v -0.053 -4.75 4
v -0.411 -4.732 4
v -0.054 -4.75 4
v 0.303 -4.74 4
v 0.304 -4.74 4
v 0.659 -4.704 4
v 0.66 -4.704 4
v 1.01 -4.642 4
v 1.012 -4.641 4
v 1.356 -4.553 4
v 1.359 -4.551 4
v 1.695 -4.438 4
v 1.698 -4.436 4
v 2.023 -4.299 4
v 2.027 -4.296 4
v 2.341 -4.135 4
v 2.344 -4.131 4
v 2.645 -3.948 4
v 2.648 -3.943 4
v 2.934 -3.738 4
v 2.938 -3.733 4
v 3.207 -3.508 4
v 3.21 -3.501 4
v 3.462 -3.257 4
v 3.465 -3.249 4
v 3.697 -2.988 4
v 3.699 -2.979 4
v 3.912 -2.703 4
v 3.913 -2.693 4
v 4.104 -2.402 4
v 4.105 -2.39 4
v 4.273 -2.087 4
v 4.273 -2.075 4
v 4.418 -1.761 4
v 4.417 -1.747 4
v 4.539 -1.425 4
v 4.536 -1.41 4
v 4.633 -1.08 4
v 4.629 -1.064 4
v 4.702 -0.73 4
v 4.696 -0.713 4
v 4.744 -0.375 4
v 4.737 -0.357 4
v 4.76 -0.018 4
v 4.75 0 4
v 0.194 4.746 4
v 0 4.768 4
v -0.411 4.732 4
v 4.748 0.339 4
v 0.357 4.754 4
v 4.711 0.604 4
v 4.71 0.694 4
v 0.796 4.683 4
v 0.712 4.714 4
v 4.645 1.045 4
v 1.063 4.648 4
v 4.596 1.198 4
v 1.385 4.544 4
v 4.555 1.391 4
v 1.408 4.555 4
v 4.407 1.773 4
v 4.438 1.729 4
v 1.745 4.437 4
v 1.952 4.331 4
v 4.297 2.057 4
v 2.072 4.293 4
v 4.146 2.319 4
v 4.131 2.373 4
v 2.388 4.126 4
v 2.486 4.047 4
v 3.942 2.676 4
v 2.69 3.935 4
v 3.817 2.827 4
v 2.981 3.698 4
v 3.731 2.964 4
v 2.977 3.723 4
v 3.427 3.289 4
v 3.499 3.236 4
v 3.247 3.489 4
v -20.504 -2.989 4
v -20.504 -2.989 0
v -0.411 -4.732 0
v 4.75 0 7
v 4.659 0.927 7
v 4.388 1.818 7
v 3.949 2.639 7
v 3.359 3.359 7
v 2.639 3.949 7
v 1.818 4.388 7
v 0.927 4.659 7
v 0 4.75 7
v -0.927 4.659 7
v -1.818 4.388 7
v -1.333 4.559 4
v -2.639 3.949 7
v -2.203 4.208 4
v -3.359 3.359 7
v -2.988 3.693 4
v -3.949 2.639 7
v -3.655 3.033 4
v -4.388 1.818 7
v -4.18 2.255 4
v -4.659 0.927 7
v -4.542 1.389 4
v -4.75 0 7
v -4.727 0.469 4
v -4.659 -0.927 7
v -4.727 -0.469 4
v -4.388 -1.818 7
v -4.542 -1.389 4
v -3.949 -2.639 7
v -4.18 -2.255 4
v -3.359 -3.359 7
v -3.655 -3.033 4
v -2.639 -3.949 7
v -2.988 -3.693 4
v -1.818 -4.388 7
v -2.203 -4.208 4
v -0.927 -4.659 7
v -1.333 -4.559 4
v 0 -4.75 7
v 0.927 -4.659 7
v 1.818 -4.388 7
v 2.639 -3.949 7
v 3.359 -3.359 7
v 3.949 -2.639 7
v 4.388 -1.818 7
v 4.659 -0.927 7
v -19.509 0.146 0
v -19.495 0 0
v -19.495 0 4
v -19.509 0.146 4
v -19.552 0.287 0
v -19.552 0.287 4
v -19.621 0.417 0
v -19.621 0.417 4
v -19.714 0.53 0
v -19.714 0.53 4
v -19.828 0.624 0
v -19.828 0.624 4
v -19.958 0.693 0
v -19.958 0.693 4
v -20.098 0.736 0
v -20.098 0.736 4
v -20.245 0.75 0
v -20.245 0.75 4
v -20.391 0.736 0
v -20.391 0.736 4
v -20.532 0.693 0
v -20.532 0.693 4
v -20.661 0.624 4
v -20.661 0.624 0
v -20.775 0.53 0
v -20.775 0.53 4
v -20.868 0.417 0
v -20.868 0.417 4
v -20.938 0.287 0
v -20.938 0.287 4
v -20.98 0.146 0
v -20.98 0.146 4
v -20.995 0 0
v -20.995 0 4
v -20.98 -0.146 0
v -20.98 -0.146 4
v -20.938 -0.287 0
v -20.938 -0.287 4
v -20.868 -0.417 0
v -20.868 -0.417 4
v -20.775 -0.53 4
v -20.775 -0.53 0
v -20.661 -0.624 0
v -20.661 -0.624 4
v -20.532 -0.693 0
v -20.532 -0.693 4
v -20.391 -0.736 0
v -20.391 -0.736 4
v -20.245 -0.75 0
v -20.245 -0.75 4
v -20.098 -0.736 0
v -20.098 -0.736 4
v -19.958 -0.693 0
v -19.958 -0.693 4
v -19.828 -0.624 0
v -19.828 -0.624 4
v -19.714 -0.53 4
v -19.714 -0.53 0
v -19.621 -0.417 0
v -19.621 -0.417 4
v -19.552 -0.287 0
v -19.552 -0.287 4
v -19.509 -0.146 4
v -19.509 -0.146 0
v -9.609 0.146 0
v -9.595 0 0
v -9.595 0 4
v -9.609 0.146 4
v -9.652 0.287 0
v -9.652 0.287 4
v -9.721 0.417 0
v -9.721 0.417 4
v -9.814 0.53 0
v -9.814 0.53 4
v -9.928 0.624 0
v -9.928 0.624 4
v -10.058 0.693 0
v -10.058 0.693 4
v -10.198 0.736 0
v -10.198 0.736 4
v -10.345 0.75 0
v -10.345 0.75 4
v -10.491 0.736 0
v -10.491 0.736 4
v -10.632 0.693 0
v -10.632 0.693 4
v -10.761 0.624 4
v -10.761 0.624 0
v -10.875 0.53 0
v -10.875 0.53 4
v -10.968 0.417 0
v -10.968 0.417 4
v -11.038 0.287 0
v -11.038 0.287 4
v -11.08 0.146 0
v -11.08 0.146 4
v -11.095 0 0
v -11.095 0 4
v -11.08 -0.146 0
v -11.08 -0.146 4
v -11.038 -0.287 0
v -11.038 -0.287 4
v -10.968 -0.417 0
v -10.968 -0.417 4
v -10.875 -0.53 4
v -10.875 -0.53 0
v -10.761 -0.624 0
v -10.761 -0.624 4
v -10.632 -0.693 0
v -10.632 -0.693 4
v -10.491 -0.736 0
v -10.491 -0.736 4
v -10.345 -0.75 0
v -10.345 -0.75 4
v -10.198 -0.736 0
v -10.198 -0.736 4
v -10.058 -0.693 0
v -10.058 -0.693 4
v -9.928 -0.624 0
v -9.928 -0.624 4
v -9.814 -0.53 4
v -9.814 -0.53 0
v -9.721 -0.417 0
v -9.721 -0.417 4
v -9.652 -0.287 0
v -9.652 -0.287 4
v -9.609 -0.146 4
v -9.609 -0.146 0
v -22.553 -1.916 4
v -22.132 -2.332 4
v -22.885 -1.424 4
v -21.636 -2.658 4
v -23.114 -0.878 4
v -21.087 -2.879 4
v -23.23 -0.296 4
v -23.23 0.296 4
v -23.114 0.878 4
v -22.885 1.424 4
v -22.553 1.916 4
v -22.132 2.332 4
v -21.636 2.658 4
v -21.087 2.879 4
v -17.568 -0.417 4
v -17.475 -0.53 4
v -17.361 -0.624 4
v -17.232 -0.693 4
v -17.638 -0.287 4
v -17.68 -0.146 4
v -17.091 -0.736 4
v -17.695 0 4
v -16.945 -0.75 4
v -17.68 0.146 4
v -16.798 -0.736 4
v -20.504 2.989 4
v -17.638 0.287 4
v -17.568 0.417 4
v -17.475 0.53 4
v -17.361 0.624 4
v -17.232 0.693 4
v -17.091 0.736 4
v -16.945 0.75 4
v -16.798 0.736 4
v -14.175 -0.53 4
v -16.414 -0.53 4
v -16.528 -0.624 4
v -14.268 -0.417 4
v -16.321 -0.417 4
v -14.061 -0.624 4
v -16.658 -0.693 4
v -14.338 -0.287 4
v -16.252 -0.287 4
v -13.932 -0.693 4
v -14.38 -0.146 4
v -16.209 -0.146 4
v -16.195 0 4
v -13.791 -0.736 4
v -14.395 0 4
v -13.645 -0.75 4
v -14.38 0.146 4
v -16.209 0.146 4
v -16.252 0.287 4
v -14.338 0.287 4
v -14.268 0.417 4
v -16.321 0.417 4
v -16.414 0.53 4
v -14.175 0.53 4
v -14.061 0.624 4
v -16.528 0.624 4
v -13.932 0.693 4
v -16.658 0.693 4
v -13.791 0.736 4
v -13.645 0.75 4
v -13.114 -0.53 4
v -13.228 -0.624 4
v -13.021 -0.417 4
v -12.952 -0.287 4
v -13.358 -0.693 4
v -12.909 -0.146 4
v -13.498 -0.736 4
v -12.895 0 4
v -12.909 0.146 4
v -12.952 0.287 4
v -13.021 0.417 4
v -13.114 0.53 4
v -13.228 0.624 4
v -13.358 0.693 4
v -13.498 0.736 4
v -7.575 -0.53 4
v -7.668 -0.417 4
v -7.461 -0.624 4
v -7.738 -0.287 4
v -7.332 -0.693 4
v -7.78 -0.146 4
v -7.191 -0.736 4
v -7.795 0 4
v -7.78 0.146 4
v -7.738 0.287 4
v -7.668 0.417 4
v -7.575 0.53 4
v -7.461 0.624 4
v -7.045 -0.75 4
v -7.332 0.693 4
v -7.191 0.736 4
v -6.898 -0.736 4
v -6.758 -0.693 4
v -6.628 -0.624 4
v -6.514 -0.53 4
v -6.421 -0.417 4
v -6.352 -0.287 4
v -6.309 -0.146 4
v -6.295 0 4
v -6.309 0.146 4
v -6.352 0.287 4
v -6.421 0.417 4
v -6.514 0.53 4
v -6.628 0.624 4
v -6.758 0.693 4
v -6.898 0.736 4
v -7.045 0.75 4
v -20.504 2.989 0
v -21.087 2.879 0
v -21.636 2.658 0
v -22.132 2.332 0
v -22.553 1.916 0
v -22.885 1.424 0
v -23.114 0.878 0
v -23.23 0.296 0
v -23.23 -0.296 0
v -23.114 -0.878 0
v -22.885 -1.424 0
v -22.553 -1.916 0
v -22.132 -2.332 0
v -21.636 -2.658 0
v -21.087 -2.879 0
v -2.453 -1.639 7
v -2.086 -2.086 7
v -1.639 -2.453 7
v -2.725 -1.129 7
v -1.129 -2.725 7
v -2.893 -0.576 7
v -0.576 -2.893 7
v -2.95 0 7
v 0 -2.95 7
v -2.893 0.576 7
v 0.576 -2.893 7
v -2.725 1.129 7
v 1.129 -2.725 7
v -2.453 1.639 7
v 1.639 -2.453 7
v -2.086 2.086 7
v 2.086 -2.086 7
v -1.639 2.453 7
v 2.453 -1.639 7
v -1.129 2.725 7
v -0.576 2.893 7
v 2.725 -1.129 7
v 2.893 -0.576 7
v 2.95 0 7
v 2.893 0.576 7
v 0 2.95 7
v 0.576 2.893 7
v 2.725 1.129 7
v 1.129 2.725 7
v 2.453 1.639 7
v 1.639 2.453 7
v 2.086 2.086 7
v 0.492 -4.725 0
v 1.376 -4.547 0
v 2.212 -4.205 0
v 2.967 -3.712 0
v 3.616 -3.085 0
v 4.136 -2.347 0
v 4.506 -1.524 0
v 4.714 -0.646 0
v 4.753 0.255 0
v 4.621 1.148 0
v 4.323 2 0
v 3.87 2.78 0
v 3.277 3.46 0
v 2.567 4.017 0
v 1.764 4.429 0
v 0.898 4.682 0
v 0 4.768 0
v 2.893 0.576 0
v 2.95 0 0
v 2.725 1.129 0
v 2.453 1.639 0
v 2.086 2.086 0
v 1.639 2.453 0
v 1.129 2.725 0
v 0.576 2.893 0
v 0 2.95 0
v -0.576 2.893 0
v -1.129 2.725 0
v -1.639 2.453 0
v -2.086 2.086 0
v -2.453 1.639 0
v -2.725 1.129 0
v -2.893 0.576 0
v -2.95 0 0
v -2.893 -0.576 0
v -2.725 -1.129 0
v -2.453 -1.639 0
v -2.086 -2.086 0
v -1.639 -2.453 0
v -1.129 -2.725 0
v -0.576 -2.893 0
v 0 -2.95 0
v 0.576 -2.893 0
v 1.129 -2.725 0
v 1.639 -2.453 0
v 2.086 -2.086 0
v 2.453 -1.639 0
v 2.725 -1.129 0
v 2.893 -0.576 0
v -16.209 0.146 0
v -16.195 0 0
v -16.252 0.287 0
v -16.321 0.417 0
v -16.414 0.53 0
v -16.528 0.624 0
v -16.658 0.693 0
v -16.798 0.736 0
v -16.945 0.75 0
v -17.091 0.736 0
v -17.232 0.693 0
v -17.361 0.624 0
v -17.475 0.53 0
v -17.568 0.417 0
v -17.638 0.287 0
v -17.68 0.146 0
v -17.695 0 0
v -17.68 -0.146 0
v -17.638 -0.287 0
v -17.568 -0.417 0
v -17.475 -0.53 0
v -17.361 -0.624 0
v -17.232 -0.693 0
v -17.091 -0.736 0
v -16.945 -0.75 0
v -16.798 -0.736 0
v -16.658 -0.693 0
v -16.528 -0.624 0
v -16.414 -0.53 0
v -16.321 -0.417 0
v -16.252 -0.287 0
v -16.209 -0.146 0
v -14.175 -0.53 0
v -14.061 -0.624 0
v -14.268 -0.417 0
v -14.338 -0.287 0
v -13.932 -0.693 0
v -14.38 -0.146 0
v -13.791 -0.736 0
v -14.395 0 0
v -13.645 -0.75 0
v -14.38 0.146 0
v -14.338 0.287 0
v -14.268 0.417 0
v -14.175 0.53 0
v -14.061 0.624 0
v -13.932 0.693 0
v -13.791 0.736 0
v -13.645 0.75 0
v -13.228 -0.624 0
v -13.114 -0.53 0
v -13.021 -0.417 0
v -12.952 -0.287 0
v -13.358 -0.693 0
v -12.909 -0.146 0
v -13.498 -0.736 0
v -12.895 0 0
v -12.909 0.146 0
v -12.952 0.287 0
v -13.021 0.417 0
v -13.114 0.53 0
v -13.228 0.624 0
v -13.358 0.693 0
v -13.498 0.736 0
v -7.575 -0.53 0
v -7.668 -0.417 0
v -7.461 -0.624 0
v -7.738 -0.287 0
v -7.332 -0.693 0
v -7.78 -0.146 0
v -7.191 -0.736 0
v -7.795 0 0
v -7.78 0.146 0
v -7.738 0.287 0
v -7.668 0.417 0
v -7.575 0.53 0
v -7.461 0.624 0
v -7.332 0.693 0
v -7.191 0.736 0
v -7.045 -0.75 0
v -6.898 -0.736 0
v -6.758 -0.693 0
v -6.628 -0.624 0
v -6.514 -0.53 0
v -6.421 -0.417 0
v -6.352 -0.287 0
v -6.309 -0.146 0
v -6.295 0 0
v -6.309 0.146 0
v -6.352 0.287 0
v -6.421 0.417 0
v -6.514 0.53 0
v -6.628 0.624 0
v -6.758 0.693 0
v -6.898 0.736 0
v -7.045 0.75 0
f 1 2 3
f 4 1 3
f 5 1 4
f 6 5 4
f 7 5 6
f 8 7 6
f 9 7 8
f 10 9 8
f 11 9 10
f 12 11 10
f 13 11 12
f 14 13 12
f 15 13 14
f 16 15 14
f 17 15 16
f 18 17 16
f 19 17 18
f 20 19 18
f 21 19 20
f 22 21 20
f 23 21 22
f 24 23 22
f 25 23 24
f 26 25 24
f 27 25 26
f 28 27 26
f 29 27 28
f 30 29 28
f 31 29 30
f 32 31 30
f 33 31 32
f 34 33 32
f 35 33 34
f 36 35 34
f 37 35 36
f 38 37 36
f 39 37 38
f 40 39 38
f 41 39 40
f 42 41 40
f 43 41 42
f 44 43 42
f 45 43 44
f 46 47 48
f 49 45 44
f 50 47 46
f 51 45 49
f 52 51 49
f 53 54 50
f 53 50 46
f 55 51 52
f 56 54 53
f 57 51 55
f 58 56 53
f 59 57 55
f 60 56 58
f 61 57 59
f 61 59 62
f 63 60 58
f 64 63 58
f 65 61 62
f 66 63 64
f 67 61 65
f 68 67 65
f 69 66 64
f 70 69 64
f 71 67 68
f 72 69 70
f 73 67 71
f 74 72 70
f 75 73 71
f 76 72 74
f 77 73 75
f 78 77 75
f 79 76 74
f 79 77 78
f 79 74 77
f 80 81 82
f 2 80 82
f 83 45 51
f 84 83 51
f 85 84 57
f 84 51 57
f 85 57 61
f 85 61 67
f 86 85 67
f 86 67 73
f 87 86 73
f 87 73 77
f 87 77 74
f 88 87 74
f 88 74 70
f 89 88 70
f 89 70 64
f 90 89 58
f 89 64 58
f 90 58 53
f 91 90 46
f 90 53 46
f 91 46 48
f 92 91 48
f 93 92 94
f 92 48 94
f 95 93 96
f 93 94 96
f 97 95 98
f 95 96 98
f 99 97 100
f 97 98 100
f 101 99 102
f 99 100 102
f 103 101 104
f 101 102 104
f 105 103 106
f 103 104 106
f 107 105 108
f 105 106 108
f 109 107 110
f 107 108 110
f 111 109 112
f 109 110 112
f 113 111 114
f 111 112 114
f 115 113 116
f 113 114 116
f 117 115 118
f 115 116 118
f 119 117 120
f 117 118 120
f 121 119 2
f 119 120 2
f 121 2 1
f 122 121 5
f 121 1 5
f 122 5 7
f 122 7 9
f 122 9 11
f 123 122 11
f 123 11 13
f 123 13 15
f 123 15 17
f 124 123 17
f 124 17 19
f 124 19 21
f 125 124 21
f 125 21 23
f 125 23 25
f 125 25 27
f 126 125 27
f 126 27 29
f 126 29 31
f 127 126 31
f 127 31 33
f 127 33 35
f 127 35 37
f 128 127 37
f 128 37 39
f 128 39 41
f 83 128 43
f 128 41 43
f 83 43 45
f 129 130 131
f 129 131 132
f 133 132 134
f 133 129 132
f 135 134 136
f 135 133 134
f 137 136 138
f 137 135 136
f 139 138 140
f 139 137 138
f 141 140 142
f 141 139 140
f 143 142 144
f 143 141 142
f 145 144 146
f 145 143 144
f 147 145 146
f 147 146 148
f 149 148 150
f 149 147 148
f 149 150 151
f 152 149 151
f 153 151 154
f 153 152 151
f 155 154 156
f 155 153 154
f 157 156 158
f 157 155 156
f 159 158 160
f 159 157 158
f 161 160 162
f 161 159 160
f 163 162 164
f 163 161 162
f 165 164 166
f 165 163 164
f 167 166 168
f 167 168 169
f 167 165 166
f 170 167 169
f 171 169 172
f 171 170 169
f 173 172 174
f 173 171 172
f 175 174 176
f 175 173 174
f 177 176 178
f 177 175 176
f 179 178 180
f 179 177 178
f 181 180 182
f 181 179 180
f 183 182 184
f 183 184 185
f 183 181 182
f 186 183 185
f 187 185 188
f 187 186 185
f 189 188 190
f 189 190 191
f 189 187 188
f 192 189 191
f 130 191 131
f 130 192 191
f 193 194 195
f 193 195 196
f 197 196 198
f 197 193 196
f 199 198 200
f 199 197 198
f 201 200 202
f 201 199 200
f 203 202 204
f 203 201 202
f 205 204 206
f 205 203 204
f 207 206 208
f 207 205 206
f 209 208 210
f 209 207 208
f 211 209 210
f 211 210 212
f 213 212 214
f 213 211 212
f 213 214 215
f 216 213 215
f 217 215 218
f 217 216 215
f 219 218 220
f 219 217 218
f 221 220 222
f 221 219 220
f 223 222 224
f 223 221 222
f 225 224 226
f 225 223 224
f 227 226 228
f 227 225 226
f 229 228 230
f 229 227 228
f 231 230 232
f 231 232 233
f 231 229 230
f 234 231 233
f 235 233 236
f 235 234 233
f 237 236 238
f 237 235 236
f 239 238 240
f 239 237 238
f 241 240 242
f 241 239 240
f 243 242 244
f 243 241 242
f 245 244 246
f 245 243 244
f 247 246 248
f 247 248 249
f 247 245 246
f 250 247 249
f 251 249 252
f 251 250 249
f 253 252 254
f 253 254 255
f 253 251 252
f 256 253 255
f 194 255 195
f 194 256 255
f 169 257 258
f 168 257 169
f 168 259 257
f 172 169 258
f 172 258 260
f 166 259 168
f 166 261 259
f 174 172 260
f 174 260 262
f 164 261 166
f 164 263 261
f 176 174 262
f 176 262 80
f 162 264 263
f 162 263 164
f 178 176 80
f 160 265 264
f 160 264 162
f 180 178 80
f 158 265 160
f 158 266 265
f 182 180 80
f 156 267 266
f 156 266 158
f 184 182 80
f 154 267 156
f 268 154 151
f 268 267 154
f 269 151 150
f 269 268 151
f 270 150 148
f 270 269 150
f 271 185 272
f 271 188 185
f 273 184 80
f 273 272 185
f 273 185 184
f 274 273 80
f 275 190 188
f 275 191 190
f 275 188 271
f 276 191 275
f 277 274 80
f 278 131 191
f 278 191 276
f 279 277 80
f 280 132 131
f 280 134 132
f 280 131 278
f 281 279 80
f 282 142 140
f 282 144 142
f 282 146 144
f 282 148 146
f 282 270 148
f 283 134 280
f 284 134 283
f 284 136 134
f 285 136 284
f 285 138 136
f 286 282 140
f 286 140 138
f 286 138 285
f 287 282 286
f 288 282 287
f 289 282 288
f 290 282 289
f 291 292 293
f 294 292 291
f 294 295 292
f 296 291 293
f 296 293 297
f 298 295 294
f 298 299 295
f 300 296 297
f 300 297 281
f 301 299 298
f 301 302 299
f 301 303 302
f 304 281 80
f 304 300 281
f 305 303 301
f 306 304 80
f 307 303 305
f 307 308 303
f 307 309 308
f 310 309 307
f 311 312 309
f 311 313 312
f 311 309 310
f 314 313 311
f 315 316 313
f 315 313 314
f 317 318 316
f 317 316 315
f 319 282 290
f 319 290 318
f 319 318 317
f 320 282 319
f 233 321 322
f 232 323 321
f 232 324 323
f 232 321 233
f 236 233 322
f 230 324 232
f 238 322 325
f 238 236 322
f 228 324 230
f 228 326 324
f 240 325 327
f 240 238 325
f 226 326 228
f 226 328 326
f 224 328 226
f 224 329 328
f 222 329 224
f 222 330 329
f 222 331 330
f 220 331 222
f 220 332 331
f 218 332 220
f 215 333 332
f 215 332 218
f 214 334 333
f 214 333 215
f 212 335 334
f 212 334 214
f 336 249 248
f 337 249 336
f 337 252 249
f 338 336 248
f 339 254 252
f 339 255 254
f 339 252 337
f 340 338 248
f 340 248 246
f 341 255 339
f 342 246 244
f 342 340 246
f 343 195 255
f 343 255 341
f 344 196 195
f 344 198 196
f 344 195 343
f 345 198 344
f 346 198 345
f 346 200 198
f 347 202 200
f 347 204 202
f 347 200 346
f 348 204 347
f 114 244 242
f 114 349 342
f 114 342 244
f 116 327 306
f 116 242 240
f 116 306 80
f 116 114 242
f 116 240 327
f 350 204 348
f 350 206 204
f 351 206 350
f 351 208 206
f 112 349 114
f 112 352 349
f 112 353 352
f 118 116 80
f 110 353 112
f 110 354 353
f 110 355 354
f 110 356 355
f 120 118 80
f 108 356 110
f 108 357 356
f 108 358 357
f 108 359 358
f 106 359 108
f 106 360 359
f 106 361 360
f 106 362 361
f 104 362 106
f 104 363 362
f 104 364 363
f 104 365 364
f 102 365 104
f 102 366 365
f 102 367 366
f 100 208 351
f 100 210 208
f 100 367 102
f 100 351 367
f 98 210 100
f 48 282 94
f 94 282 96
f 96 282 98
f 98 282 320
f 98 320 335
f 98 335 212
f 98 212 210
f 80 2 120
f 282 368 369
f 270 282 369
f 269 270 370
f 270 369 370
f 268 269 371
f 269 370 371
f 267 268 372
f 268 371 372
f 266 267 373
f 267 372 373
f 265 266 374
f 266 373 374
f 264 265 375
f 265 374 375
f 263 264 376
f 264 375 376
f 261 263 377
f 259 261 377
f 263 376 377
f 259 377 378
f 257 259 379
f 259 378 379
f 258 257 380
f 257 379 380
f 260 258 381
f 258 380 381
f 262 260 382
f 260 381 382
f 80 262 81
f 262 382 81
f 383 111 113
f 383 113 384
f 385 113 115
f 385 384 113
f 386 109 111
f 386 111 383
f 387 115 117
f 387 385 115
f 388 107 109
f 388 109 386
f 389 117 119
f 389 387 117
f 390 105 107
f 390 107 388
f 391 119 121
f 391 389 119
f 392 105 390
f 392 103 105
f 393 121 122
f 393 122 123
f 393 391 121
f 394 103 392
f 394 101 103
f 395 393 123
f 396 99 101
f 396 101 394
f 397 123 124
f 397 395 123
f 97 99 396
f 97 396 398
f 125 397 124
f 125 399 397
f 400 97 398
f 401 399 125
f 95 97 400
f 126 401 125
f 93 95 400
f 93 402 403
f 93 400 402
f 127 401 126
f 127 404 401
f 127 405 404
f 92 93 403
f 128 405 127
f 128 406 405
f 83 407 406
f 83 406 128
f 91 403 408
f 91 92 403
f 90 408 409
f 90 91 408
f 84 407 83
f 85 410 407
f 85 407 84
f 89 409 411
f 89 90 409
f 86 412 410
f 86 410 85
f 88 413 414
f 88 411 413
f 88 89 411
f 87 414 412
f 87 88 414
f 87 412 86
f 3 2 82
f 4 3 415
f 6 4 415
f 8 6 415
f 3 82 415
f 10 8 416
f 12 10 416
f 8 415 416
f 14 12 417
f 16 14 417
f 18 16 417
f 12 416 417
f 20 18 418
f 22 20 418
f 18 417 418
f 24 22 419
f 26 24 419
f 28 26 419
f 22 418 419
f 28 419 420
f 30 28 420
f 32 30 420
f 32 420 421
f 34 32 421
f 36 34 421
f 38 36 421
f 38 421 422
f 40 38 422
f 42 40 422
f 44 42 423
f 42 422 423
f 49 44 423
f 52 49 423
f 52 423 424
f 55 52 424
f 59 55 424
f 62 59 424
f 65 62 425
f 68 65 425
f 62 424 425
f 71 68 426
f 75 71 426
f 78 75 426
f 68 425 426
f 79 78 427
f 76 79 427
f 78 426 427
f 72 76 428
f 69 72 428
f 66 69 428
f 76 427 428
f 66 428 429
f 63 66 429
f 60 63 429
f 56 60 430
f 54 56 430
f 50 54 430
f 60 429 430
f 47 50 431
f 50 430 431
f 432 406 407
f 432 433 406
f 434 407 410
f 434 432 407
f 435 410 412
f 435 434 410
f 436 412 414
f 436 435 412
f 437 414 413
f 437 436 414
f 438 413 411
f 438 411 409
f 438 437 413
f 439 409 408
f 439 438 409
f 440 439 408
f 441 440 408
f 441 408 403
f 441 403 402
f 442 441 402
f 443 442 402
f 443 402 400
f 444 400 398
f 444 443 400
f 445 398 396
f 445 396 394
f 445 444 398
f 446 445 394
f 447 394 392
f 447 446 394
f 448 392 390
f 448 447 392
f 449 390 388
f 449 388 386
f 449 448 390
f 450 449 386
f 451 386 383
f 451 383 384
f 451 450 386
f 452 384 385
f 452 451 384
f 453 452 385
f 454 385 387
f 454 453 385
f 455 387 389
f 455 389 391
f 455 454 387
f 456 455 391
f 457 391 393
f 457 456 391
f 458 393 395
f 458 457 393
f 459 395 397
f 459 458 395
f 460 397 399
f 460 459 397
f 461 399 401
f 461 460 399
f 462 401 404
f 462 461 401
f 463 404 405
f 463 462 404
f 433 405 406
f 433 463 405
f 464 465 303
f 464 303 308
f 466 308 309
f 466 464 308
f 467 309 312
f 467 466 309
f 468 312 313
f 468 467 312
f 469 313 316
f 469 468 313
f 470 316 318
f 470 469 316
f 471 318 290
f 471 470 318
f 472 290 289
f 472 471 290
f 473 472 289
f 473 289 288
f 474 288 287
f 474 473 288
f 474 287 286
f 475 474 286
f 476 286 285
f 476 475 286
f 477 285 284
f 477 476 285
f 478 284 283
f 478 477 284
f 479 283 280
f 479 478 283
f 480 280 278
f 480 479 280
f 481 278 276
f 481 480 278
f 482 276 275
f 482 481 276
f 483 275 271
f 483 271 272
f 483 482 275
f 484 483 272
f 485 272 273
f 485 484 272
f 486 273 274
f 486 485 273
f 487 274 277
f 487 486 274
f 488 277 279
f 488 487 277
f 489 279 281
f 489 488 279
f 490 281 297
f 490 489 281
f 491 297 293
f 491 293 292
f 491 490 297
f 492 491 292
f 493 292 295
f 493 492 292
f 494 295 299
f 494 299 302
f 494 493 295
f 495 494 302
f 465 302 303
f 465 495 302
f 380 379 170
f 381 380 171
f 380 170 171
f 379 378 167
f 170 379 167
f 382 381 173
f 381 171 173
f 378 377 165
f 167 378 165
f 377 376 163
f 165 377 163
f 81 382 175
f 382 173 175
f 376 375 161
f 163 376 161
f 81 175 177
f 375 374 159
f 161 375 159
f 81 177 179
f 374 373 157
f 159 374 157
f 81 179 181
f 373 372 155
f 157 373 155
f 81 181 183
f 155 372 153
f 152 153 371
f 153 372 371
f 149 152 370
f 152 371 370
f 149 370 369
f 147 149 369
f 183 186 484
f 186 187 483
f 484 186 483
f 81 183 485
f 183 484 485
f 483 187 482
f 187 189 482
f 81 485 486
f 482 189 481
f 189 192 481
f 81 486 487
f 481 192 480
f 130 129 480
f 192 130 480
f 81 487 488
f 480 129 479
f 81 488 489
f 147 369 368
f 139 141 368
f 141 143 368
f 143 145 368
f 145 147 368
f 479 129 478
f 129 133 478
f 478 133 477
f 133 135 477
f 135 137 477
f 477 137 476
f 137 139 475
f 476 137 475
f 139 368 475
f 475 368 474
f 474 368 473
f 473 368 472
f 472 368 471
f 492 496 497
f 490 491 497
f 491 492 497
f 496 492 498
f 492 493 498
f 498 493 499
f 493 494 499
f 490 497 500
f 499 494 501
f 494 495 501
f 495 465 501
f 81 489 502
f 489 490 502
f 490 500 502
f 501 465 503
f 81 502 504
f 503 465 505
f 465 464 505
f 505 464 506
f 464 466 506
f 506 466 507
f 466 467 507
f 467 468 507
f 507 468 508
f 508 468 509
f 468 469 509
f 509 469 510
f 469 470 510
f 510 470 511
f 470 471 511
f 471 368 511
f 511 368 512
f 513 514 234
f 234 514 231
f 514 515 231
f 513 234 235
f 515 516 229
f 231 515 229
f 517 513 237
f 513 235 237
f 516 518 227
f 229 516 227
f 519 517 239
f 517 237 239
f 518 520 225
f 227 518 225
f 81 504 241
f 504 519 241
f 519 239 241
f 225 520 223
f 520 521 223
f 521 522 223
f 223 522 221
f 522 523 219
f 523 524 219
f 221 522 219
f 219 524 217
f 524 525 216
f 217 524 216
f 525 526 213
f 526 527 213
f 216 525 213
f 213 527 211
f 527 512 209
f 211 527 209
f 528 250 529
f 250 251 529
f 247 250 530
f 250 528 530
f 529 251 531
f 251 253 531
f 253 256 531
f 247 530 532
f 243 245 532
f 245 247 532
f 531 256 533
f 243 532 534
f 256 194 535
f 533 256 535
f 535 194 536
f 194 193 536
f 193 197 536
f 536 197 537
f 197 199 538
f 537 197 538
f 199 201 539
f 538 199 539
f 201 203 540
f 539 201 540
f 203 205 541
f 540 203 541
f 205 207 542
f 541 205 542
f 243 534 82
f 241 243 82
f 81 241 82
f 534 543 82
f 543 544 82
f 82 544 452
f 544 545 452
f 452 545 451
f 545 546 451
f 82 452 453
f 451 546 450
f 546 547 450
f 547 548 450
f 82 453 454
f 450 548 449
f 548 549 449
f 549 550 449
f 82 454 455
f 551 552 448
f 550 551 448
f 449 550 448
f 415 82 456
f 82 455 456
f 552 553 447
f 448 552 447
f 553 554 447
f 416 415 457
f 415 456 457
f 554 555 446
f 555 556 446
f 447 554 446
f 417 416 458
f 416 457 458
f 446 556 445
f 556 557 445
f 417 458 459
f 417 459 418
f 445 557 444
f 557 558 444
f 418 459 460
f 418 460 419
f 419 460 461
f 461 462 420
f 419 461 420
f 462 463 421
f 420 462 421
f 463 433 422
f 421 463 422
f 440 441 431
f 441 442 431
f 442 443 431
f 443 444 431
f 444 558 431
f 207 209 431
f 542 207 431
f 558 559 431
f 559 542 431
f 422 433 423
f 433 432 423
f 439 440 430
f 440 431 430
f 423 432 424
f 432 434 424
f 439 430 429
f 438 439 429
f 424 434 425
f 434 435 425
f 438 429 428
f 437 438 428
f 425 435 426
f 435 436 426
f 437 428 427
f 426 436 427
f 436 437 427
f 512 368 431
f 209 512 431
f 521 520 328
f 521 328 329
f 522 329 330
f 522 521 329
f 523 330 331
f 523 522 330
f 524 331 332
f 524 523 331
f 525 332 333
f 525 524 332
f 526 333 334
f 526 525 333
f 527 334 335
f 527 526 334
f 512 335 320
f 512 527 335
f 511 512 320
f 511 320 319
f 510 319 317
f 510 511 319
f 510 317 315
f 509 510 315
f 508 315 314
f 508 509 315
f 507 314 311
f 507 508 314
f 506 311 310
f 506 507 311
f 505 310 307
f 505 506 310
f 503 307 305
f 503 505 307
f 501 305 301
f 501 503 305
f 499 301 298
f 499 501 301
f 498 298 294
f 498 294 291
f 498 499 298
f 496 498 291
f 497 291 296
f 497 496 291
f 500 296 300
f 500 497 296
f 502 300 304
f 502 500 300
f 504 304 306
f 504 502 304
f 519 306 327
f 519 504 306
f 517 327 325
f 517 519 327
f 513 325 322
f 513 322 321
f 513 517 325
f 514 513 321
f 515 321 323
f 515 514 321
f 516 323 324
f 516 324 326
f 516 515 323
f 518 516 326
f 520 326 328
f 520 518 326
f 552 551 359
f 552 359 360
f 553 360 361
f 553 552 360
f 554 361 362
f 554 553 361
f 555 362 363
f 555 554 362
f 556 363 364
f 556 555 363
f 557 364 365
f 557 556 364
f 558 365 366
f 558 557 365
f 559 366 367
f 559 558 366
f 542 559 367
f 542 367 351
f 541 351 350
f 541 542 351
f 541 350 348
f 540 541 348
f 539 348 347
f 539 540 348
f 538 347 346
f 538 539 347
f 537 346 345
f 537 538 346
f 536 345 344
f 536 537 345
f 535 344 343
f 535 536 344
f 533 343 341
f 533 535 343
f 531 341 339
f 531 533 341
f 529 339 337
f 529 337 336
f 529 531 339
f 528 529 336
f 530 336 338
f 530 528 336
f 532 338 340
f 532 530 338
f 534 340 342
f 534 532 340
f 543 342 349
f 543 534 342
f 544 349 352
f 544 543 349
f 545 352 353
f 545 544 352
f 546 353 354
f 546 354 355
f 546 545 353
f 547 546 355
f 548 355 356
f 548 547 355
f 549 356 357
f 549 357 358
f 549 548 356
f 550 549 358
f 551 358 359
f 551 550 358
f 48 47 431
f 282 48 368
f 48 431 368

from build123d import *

# Parameters (mm, degrees)
SKETCH1_R           = 2.95
SKETCH1_R_2         = 0.75
BOSS_EXTRUDE1_DEPTH = 4
SKETCH2_R           = 4.75
SKETCH2_R_2         = 2.95
BOSS_EXTRUDE2_DEPTH = 3


with BuildPart() as part:
    # Sketch1 → Boss-Extrude1 (new body)
    with BuildSketch(Plane.XY):
        with BuildLine():
            Line((0, 4.76784671), (-20.504052607, 2.988770585))
            ThreePointArc((-20.504052607, 2.988770585), (-23.244725805, 0), (-20.504052607, -2.988770585))
            Line((-20.504052607, -2.988770585), (-0.41060077, -4.732220093))
            ThreePointArc((-0.41060077, -4.732220093), (4.755274195, -0.196586841), (0, 4.76784671))
        make_face()
        Circle(SKETCH1_R, mode=Mode.SUBTRACT)
        with Locations((-20.244725805, 0)):
            Circle(SKETCH1_R_2, mode=Mode.SUBTRACT)
        with Locations((-16.944725805, 0)):
            Circle(SKETCH1_R_2, mode=Mode.SUBTRACT)
        with Locations((-13.644725805, 0)):
            Circle(SKETCH1_R_2, mode=Mode.SUBTRACT)
        with Locations((-10.344725805, 0)):
            Circle(SKETCH1_R_2, mode=Mode.SUBTRACT)
        with Locations((-7.044725805, 0)):
            Circle(SKETCH1_R_2, mode=Mode.SUBTRACT)
    extrude(amount=BOSS_EXTRUDE1_DEPTH)

    # Sketch2 → Boss-Extrude2 (add)
    with BuildSketch(Plane.XY.offset(4)):
        Circle(SKETCH2_R)
        Circle(SKETCH2_R_2, mode=Mode.SUBTRACT)
    extrude(amount=BOSS_EXTRUDE2_DEPTH)


solid = part.part
